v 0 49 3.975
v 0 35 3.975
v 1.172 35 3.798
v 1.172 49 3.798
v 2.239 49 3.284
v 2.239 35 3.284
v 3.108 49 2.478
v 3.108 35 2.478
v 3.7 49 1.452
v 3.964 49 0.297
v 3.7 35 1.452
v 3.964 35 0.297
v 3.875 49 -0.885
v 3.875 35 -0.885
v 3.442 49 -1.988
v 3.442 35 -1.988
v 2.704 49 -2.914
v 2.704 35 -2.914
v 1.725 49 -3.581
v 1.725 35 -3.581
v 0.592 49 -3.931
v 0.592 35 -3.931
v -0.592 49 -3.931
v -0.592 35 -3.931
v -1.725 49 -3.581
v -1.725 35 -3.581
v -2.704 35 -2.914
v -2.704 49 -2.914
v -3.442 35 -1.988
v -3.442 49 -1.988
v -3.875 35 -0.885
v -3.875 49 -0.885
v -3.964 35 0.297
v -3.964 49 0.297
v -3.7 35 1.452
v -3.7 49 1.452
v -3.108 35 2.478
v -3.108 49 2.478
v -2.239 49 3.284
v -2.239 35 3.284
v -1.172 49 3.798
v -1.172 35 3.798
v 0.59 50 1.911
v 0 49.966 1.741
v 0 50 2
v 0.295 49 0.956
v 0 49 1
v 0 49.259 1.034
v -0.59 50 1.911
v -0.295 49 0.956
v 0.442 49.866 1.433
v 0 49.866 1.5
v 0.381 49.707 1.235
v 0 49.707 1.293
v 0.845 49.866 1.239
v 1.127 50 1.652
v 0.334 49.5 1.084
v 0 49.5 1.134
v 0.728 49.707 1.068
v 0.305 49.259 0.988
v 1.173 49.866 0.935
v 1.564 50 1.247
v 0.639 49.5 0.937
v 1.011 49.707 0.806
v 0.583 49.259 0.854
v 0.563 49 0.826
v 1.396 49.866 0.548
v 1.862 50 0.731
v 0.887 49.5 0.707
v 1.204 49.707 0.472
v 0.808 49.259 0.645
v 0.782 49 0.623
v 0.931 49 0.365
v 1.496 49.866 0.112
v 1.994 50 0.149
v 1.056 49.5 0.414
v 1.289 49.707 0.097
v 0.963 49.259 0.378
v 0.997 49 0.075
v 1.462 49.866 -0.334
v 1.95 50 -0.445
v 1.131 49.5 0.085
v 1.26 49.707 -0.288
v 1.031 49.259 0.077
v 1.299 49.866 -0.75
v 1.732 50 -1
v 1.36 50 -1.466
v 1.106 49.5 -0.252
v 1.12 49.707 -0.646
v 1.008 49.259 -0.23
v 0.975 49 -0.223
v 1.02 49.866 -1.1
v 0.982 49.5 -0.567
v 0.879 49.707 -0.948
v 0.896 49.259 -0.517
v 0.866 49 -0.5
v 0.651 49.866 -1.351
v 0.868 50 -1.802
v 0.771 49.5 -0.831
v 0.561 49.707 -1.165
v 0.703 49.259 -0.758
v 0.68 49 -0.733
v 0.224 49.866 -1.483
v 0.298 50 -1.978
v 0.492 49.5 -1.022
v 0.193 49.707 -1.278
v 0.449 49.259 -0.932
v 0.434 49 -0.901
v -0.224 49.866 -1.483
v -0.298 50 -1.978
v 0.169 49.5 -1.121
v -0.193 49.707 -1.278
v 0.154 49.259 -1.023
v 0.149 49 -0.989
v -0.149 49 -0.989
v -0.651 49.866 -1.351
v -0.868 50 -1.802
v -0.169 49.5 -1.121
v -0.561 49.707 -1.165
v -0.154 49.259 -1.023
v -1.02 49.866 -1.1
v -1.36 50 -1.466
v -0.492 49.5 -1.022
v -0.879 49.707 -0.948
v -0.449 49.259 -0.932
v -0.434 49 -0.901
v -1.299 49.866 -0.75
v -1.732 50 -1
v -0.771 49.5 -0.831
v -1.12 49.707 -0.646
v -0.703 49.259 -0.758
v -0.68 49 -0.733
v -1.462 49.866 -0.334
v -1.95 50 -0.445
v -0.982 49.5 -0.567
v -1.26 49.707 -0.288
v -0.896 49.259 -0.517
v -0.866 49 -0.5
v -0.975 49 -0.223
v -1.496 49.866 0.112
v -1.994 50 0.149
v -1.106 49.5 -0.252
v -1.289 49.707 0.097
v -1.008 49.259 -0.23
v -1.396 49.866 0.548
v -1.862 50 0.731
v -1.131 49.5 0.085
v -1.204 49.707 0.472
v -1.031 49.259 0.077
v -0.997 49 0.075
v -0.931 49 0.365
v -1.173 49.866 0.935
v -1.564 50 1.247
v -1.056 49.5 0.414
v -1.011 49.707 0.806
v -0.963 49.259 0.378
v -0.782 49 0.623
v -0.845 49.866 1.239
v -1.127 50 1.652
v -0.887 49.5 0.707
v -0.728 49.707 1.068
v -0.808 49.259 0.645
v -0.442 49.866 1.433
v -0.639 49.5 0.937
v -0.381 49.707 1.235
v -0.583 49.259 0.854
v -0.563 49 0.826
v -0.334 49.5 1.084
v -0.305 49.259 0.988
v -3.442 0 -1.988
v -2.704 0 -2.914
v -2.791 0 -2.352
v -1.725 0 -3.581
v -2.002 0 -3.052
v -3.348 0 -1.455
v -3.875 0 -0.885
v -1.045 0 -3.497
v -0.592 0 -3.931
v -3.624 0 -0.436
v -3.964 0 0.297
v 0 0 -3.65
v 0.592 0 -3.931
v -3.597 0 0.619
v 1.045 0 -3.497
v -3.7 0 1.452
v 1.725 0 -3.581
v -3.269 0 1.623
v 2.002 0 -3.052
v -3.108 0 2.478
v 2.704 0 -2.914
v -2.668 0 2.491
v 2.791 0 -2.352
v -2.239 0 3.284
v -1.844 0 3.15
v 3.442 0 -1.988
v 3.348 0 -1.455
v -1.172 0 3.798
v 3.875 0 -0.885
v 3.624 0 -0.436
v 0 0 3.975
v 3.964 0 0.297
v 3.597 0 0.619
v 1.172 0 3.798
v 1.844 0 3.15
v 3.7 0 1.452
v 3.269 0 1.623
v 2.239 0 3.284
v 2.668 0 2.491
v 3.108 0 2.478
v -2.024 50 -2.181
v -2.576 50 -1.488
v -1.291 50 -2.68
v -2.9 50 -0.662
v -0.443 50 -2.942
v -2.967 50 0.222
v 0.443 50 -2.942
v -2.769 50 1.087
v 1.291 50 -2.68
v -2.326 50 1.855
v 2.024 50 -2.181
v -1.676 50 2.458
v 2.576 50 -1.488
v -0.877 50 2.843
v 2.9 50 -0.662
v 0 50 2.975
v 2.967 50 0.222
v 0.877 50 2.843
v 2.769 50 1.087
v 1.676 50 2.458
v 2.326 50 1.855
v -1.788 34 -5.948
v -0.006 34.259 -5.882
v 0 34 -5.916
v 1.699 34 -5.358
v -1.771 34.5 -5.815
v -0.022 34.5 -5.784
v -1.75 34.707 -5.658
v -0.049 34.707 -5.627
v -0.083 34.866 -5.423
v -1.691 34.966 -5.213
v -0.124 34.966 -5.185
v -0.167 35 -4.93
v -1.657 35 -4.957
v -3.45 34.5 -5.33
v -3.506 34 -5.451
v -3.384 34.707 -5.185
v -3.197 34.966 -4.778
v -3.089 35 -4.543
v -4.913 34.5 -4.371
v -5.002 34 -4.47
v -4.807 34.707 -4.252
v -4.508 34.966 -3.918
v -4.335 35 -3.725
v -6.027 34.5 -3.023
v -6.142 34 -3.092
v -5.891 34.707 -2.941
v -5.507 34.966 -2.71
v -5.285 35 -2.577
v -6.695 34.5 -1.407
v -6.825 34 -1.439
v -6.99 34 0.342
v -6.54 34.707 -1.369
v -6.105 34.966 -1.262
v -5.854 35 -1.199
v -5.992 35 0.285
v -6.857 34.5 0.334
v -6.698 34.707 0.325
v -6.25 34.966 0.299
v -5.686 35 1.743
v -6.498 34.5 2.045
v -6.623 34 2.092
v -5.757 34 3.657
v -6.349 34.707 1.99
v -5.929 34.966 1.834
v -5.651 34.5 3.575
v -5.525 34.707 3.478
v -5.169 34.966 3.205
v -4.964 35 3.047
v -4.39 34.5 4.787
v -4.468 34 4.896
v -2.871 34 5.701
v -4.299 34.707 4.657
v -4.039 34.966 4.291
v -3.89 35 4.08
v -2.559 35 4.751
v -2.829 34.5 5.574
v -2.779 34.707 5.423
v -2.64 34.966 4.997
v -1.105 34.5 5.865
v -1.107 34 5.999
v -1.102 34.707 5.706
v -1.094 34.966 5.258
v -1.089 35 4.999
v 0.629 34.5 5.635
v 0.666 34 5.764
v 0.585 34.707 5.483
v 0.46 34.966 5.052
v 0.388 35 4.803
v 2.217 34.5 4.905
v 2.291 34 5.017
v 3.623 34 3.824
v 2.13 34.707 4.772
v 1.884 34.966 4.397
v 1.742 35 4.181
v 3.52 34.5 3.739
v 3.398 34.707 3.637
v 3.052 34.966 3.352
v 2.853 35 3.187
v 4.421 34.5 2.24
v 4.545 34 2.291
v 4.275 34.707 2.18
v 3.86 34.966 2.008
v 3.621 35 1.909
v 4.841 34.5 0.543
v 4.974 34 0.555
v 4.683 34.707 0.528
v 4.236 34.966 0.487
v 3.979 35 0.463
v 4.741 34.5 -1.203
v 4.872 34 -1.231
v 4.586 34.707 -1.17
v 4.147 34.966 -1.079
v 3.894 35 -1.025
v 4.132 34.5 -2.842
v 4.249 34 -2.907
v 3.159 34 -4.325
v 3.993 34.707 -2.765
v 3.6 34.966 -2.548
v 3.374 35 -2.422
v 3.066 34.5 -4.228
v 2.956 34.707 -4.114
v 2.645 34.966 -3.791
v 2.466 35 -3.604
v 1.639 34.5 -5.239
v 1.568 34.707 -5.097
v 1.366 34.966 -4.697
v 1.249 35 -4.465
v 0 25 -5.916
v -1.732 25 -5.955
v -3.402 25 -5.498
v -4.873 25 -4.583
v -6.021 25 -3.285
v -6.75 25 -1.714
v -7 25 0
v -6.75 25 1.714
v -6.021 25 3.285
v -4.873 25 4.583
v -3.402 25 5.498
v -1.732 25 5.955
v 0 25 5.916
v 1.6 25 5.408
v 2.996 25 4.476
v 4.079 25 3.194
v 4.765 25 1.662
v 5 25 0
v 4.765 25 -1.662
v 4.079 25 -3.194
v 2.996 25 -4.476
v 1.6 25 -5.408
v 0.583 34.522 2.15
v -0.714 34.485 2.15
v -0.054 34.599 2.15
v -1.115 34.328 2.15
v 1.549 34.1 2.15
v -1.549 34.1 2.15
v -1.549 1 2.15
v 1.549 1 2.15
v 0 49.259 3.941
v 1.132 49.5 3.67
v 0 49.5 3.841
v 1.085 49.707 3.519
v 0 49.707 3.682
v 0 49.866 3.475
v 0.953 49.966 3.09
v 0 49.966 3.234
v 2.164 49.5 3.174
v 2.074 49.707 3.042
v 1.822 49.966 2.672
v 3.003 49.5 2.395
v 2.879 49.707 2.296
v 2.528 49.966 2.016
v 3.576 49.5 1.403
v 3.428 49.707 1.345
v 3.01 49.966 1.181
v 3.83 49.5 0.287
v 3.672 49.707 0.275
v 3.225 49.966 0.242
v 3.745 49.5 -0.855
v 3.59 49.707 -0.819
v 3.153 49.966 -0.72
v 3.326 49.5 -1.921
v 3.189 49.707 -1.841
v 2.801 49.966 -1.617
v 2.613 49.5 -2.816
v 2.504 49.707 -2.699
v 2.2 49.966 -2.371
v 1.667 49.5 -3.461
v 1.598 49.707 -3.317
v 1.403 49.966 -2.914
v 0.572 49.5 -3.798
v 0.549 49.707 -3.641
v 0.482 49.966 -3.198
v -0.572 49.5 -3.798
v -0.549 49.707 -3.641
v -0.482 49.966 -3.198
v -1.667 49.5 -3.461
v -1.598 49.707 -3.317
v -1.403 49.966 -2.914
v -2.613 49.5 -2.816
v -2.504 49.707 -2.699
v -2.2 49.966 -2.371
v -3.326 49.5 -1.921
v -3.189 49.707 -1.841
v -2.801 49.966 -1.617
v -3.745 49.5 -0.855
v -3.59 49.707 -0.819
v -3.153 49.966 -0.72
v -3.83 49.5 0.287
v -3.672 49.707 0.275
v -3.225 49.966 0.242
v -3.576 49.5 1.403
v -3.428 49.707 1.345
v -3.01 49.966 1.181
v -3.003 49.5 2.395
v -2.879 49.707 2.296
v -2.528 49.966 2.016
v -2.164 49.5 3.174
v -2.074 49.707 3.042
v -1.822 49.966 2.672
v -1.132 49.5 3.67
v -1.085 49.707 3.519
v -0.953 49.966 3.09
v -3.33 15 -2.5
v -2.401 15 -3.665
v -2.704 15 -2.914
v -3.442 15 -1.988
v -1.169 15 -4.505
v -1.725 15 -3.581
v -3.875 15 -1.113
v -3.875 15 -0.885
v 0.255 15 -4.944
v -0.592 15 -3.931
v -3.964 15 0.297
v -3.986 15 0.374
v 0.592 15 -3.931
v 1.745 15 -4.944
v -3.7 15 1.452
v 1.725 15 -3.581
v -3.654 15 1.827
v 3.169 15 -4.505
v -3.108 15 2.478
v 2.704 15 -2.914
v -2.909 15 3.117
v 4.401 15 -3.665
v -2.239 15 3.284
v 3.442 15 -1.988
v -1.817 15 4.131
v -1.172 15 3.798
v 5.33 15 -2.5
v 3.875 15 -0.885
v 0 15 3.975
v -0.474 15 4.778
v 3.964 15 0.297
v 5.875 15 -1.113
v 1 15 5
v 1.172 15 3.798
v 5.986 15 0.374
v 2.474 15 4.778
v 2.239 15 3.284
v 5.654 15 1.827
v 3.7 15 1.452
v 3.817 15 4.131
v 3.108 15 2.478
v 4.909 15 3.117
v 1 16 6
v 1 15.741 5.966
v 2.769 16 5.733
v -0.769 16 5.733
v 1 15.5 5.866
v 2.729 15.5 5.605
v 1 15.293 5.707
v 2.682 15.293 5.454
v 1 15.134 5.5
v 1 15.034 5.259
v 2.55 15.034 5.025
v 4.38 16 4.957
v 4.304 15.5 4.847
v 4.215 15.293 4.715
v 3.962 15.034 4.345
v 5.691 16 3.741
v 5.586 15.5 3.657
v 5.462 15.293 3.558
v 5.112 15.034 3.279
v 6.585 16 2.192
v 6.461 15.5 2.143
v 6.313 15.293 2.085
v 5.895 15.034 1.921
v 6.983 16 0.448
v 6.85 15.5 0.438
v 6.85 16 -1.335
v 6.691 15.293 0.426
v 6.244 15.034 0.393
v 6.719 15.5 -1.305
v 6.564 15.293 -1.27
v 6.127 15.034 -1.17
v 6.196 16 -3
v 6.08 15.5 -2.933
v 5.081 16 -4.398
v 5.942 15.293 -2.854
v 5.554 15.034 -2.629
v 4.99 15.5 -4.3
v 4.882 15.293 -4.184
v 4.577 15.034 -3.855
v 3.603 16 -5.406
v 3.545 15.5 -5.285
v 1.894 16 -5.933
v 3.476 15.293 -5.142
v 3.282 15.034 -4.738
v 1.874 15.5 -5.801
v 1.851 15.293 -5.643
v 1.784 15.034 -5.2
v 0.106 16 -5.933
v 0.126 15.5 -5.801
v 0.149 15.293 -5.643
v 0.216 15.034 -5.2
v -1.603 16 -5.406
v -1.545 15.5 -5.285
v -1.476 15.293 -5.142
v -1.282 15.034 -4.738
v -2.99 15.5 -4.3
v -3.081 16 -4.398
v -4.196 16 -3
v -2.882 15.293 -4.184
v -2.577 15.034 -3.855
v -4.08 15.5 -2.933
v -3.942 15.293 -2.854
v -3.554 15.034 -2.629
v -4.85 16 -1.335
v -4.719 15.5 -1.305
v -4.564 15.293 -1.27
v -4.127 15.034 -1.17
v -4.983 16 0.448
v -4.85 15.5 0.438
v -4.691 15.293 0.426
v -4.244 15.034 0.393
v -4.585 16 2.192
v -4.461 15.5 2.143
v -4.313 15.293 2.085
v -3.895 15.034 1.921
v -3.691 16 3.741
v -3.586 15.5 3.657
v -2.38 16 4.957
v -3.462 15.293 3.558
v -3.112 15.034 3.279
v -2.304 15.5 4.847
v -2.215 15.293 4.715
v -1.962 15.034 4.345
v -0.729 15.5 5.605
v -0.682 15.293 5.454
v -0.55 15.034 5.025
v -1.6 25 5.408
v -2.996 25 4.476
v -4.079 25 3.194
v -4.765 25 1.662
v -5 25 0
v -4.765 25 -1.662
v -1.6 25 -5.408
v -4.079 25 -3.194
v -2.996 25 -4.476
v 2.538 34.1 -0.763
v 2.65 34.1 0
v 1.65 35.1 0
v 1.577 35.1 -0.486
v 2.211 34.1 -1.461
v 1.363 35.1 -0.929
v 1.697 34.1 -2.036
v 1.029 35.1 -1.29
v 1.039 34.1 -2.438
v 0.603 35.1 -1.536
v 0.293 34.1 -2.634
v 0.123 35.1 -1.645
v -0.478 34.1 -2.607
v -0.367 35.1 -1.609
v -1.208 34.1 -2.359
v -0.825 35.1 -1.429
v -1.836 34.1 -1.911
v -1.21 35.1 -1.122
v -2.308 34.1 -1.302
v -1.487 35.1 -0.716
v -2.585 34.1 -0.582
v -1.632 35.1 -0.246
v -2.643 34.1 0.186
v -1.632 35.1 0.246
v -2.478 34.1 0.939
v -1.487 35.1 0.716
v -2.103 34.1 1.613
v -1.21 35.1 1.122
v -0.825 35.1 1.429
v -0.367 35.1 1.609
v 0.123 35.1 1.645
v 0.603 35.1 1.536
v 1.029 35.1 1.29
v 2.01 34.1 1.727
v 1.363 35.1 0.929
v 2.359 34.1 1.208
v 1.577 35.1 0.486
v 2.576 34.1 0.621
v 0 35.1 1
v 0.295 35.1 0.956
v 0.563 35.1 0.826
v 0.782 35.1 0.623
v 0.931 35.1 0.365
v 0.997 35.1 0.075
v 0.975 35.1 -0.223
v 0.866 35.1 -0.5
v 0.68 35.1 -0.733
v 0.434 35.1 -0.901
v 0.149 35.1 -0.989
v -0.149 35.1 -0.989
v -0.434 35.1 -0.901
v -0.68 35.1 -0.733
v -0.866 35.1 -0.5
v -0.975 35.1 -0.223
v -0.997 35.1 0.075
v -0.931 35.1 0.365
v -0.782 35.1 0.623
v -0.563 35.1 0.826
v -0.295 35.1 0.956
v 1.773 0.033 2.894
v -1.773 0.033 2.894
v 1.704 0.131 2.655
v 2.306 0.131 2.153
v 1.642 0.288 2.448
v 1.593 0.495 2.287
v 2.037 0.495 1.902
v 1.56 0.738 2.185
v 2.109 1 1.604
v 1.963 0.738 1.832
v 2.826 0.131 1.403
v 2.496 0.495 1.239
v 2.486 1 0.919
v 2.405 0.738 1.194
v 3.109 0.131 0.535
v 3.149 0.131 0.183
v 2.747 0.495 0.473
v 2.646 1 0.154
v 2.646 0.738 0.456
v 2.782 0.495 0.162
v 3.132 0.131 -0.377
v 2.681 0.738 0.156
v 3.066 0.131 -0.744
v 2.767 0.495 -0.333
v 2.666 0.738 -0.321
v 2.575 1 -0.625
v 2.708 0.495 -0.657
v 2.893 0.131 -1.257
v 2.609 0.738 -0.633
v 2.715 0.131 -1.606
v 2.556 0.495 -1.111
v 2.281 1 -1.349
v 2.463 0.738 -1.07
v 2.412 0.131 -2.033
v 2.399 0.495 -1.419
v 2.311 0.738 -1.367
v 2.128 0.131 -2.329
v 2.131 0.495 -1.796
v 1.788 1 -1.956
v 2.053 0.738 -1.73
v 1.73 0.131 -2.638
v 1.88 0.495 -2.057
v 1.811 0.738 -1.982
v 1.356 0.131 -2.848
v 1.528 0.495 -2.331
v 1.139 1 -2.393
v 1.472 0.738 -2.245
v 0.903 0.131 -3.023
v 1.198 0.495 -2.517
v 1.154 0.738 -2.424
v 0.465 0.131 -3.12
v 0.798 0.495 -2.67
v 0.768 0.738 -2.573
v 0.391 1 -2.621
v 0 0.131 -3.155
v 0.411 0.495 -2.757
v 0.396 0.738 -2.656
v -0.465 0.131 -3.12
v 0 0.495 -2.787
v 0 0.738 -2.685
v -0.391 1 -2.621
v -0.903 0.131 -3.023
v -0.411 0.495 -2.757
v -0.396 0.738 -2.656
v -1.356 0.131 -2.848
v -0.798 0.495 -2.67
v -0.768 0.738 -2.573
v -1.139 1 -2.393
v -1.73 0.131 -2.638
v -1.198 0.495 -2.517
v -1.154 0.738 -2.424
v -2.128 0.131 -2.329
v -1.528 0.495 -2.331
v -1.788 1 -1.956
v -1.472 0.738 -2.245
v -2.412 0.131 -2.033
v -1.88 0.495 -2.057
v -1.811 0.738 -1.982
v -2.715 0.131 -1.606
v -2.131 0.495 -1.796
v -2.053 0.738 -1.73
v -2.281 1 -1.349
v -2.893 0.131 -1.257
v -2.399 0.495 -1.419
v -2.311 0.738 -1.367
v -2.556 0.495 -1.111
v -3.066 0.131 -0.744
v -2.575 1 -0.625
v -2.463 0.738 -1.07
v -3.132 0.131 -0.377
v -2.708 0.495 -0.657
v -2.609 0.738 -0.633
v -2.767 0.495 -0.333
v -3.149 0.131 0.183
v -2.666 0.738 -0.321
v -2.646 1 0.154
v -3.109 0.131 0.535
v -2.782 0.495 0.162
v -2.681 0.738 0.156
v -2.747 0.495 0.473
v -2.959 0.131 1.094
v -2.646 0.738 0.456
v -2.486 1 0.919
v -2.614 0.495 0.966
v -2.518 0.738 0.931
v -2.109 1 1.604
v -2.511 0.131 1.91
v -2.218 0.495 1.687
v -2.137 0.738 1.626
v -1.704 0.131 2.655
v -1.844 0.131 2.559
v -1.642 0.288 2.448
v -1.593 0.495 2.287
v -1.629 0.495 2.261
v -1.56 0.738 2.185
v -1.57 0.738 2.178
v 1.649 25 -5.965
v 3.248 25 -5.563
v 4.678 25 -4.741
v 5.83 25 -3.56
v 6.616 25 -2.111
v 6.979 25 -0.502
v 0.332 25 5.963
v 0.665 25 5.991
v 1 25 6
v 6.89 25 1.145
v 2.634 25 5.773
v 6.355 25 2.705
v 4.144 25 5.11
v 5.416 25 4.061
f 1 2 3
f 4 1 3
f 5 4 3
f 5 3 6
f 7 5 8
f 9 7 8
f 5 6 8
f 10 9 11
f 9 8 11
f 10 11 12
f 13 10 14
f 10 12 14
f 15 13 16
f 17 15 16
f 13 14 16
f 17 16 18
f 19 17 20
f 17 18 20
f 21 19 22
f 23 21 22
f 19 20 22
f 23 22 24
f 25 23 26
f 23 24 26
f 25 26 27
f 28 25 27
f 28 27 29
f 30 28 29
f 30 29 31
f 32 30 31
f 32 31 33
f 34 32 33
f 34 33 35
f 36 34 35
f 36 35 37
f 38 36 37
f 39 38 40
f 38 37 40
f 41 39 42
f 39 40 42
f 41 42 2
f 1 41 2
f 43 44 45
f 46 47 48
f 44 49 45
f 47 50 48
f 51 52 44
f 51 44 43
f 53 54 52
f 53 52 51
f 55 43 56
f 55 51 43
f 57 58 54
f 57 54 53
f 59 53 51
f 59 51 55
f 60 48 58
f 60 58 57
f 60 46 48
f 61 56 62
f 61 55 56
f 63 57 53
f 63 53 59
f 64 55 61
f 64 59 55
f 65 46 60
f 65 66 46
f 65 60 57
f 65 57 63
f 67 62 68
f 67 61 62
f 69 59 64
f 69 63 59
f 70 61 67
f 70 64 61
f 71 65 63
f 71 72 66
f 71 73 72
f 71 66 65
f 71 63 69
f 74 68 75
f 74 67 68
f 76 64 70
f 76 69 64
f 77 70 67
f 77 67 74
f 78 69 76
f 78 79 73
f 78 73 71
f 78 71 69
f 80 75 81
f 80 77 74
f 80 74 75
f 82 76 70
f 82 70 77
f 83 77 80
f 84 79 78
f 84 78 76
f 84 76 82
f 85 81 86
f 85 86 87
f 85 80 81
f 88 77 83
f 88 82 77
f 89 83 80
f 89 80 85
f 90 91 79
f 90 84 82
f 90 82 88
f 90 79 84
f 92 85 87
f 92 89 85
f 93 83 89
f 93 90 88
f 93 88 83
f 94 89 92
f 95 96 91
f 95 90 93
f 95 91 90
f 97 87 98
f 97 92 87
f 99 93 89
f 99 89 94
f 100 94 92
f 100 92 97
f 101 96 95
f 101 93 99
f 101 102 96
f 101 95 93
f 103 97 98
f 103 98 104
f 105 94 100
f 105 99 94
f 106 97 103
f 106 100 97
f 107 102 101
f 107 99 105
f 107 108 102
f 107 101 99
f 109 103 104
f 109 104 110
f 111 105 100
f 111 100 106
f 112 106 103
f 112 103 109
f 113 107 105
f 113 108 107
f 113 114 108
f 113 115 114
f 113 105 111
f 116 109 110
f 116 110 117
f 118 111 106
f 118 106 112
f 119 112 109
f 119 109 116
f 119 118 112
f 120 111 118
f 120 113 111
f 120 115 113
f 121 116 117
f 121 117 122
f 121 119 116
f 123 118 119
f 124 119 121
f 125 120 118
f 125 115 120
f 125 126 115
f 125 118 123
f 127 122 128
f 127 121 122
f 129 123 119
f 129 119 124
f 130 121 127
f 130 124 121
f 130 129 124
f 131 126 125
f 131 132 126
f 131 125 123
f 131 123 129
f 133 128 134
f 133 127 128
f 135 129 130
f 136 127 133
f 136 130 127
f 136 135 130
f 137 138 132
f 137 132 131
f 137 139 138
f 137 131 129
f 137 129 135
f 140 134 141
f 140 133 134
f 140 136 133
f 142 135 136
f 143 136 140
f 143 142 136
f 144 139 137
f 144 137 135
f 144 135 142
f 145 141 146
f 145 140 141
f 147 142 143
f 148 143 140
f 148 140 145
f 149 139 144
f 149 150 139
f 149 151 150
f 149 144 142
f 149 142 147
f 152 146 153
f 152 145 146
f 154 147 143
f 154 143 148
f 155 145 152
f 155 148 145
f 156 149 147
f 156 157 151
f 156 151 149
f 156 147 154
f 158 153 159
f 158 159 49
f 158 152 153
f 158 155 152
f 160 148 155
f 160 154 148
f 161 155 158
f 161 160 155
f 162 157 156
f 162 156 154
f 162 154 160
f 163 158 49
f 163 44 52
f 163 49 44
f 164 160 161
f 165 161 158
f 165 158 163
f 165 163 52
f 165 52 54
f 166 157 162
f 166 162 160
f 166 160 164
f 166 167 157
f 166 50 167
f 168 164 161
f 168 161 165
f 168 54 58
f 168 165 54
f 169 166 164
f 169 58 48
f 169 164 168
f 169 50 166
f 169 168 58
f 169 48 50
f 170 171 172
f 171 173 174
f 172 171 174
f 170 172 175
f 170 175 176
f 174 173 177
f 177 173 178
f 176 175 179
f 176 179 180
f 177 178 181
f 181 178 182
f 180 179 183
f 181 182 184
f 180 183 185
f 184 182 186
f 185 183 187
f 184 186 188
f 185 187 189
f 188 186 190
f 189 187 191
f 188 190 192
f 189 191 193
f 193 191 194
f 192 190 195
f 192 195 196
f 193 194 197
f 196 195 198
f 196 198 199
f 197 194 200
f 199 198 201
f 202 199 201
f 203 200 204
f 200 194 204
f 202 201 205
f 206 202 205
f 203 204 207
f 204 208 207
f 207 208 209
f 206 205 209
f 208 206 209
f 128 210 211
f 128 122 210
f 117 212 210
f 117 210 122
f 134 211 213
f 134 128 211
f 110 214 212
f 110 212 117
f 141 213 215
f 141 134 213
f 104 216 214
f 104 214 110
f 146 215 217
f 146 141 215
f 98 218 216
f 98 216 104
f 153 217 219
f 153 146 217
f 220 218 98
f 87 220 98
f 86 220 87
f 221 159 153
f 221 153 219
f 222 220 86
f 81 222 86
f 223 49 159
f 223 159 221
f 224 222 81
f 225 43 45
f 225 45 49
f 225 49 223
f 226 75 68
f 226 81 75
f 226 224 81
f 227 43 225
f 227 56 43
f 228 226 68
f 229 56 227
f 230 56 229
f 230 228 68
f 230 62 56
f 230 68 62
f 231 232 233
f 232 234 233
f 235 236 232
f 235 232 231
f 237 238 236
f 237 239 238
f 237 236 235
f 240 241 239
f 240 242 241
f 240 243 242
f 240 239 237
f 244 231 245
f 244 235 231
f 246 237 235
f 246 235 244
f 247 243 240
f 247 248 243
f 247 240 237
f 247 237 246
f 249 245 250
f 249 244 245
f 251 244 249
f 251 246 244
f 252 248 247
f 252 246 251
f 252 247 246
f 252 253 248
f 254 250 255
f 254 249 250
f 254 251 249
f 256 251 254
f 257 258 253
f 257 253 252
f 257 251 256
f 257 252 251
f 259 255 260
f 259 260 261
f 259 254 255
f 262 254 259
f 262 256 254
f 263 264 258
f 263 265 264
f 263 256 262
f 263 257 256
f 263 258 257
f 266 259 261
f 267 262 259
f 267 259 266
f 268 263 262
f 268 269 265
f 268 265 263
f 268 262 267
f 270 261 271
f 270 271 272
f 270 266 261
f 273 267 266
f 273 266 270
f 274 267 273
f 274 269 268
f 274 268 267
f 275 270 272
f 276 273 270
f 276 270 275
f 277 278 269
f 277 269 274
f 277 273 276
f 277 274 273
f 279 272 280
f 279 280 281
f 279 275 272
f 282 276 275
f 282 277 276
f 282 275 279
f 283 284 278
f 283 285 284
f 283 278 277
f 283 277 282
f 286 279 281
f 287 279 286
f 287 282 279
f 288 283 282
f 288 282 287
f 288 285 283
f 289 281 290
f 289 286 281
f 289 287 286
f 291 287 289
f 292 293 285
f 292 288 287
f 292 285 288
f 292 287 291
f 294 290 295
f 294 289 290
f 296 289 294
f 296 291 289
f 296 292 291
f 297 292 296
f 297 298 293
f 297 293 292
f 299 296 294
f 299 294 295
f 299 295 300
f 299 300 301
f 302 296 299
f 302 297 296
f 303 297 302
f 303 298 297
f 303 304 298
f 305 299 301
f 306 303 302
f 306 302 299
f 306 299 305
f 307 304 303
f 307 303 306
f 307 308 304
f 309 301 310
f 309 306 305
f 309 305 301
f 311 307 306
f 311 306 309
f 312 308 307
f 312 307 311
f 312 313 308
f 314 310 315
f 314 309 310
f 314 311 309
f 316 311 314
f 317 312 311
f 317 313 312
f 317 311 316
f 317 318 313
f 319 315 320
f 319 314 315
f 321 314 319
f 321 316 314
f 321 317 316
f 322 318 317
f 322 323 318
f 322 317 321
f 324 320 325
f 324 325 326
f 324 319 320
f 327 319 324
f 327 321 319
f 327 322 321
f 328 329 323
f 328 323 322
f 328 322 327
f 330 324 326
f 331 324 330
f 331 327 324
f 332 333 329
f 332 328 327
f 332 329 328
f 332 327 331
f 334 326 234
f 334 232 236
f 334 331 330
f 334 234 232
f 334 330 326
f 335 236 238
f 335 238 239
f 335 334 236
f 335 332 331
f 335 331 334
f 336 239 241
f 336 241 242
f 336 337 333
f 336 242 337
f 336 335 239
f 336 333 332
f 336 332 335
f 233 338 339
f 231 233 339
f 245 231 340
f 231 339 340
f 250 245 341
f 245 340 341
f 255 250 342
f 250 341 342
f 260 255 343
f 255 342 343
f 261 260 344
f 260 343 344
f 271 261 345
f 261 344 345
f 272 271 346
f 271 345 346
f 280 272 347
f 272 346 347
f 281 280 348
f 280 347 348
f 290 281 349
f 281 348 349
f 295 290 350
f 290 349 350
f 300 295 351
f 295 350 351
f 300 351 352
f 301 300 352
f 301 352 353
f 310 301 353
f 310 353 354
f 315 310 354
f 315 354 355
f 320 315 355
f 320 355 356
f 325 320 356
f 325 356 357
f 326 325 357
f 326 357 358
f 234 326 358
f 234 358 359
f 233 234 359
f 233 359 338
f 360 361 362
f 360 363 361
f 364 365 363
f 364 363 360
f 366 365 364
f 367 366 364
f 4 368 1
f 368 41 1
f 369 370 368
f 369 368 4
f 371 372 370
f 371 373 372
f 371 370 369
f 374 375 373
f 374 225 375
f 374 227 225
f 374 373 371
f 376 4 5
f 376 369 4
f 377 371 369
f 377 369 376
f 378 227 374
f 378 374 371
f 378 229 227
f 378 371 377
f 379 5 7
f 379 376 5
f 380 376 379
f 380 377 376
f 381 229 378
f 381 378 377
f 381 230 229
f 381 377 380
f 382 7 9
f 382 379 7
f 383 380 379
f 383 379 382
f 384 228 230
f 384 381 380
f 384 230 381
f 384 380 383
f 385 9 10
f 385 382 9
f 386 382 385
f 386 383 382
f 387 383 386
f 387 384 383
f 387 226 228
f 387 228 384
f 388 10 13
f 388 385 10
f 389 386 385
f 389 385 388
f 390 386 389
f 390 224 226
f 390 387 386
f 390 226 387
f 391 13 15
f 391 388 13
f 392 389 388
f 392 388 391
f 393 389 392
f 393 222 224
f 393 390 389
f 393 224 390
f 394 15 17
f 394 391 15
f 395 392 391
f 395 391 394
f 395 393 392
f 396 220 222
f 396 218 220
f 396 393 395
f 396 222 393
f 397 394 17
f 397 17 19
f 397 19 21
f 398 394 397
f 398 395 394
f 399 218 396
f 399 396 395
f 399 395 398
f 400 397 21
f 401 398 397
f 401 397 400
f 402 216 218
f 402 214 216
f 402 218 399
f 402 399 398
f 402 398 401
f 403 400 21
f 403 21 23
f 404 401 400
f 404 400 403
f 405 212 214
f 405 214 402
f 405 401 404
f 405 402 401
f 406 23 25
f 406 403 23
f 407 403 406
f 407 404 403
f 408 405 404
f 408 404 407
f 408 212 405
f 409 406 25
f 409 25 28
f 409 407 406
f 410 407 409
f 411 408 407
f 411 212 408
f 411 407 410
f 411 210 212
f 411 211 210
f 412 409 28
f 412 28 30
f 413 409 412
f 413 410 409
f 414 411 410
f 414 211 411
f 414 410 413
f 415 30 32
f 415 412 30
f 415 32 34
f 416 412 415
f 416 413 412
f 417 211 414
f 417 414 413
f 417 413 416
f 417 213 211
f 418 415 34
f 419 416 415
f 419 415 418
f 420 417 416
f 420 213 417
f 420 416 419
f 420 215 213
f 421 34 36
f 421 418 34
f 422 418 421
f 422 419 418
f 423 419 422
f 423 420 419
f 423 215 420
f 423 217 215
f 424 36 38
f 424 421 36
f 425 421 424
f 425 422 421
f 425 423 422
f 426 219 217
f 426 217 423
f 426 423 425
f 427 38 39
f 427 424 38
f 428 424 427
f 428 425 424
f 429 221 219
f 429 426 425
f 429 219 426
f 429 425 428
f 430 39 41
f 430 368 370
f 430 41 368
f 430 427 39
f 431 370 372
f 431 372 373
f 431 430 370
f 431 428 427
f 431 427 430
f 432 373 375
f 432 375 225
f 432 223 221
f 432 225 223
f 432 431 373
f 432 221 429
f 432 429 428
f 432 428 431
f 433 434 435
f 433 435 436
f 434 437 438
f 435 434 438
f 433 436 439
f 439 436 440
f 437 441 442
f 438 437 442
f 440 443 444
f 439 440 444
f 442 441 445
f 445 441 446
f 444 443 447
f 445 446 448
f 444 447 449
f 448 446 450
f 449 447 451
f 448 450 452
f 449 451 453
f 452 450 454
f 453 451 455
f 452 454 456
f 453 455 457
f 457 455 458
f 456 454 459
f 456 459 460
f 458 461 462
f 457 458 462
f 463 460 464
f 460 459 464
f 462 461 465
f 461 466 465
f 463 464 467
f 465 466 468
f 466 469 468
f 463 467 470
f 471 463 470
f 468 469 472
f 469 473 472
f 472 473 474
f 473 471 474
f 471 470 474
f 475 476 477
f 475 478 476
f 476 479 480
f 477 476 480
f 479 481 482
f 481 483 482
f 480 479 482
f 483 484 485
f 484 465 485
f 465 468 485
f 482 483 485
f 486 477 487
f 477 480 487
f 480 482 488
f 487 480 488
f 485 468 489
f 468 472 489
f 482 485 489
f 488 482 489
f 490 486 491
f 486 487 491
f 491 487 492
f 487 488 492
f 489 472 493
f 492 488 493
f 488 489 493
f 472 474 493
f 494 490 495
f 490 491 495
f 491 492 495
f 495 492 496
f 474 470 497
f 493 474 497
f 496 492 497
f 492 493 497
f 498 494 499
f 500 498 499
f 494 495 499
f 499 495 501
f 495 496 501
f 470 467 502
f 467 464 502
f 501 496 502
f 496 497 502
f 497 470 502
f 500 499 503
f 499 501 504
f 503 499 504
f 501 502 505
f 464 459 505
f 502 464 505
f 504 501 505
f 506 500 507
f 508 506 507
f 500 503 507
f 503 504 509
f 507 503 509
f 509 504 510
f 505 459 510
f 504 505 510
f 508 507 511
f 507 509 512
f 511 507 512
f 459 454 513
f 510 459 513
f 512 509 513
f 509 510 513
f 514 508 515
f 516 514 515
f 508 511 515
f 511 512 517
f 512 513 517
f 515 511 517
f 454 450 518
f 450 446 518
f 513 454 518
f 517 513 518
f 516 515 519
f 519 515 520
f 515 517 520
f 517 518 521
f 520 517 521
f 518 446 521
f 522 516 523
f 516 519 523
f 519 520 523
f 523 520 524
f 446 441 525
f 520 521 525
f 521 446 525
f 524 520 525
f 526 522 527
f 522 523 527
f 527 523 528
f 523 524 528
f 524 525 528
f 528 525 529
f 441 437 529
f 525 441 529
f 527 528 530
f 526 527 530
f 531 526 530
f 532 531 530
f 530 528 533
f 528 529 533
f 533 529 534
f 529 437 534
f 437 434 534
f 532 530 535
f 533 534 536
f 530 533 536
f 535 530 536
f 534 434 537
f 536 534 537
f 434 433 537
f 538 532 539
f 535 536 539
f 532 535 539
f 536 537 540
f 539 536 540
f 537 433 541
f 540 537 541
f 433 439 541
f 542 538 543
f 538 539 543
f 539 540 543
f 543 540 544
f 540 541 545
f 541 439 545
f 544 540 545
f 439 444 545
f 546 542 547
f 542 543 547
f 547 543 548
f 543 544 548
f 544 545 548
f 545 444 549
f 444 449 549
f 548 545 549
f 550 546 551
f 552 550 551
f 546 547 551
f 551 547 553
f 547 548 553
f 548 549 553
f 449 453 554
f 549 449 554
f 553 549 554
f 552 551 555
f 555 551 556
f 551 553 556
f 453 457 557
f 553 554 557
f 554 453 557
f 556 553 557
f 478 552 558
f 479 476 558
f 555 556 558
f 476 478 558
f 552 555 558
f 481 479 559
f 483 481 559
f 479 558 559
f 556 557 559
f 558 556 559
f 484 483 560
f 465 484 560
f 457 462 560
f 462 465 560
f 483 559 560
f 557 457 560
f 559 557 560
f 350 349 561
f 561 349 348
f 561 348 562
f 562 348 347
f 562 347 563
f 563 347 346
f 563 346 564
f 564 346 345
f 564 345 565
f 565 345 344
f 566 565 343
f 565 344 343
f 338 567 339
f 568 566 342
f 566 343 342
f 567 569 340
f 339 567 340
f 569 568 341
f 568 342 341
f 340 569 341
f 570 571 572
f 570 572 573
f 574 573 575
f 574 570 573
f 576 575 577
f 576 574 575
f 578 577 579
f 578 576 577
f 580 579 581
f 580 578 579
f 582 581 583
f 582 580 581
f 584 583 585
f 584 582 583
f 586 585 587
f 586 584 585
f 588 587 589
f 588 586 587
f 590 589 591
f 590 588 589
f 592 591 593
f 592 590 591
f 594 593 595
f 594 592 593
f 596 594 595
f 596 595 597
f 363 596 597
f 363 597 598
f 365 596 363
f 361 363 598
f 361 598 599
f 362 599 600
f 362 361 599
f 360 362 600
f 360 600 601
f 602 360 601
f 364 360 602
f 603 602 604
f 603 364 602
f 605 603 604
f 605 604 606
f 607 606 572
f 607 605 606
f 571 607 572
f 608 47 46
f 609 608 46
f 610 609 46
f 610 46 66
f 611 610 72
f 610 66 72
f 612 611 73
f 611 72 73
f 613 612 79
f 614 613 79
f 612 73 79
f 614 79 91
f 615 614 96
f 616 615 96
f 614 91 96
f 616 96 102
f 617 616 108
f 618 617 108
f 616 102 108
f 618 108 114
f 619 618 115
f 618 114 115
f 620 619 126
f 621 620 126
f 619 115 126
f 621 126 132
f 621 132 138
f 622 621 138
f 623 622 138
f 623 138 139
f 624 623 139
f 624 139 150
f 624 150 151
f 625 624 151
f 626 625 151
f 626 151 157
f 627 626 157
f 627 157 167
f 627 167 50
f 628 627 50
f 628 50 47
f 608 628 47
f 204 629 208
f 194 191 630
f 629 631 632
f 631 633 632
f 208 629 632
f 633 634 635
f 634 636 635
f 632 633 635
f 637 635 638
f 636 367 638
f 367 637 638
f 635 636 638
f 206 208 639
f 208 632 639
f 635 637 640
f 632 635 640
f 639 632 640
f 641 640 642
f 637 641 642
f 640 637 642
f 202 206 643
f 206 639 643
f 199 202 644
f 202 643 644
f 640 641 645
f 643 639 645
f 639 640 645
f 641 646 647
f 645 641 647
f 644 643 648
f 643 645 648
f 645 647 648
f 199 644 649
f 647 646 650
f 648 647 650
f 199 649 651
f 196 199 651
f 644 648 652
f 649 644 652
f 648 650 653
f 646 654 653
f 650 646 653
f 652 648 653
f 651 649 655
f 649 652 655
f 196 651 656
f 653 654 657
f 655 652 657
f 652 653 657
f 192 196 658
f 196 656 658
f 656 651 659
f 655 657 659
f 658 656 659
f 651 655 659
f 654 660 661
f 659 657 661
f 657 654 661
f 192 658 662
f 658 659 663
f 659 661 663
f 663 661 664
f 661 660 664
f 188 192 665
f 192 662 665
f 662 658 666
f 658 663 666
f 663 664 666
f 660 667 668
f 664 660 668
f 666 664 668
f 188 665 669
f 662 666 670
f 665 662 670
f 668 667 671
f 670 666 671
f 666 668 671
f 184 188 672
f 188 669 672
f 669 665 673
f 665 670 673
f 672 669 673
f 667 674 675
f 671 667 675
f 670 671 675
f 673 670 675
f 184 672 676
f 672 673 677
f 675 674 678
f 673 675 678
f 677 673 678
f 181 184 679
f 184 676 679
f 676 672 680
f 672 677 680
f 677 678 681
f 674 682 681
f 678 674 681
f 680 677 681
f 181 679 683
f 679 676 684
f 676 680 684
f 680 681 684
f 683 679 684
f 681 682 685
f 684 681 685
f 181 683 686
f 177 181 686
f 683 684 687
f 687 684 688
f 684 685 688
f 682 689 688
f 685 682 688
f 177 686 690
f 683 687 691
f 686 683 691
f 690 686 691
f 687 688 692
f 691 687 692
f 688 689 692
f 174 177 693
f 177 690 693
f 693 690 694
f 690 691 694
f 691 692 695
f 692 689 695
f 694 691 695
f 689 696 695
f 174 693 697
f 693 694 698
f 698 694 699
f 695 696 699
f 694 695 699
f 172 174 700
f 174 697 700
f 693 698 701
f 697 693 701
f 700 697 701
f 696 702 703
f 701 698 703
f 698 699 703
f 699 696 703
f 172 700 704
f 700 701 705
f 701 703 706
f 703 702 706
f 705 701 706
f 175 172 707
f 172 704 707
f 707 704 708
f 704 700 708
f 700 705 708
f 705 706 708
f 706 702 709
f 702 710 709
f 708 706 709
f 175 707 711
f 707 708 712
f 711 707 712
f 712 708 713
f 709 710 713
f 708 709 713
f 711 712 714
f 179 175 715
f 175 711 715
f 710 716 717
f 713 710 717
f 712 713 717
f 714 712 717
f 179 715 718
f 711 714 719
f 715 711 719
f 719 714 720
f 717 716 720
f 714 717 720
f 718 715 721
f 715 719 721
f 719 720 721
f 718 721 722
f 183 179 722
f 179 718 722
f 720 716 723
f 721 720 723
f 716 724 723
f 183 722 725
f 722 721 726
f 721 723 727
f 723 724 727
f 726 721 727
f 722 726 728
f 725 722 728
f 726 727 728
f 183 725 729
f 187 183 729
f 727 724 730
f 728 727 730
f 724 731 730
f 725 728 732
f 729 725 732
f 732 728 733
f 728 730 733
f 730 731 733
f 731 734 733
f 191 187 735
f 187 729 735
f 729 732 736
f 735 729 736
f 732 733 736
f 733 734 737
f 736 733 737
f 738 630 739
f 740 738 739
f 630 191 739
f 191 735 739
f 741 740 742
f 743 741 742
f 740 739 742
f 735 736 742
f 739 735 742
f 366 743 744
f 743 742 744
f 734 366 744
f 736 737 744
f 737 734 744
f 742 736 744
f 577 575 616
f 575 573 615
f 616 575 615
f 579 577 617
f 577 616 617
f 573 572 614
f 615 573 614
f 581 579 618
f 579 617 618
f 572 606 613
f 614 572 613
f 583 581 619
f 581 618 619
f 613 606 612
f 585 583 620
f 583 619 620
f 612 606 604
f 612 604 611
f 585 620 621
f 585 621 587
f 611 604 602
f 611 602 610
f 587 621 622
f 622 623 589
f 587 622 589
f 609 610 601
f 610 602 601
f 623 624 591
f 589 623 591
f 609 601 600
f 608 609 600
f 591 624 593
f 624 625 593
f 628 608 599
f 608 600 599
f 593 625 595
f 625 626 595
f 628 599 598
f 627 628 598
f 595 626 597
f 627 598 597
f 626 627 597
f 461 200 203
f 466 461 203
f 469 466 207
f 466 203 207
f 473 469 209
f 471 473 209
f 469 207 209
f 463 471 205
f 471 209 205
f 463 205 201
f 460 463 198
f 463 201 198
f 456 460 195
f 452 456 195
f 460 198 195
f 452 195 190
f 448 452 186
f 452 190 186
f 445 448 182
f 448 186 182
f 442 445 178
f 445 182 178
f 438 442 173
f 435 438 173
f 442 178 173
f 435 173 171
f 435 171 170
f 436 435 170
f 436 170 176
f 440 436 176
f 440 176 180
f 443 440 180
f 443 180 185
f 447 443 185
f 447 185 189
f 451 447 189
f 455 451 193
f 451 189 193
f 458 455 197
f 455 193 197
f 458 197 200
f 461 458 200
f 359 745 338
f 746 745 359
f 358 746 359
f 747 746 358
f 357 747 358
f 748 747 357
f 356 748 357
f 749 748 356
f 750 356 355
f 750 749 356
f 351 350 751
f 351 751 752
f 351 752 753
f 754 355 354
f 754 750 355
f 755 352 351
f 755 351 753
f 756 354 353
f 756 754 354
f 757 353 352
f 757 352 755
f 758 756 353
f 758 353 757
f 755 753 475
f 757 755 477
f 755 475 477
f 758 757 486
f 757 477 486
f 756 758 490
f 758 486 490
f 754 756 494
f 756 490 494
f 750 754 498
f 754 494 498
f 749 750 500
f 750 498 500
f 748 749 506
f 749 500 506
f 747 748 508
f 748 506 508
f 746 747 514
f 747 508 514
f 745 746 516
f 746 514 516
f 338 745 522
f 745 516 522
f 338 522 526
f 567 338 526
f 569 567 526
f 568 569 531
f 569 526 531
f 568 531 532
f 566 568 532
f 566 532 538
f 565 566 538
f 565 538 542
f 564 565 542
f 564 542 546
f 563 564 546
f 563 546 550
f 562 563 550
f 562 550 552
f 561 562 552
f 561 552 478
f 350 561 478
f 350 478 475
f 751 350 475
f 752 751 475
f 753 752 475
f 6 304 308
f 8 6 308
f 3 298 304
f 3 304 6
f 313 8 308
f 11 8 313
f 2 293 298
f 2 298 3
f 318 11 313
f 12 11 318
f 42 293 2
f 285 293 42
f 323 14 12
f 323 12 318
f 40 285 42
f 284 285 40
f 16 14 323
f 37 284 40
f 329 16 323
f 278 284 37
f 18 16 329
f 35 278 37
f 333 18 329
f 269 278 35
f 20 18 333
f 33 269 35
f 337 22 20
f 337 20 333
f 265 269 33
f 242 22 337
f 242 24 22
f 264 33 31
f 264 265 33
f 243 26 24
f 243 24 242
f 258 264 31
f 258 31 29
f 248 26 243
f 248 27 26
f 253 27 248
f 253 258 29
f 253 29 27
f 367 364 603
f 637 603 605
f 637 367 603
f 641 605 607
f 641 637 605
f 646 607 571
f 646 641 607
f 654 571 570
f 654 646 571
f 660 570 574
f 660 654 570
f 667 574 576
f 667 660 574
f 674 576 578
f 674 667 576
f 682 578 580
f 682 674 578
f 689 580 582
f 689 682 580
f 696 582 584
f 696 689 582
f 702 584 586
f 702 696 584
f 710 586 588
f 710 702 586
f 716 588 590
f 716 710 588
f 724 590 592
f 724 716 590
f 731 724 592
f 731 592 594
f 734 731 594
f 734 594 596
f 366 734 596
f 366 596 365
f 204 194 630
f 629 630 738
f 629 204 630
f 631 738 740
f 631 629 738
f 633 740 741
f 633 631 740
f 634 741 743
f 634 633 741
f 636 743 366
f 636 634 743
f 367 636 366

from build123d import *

# Parameters (mm, degrees)
SKETCH1_R           = 3.975
BOSS_EXTRUDE1_DEPTH = 15
SKETCH2_R           = 6
BOSS_EXTRUDE2_DEPTH = 10
SKETCH3_R           = 6
BOSS_EXTRUDE3_DEPTH = 10
SKETCH4_R           = 3.975
BOSS_EXTRUDE4_DEPTH = 15
CUT_EXTRUDE1_DEPTH  = 35.1
SKETCH6_R           = 1
CUT_EXTRUDE2_DEPTH  = 45
FILLET1_R           = 1
FILLET2_R           = 1


with BuildPart() as part:
    # Sketch1 → Boss-Extrude1 (new body)
    with BuildSketch(Plane(origin=(0, 0, 0), x_dir=(1, 0, 0), z_dir=(0, 1, 0))):
        with Locations(Location((0, 0, 0), (0, 0, 270))):
            Circle(SKETCH1_R)
    extrude(amount=BOSS_EXTRUDE1_DEPTH)

    # Sketch2 → Boss-Extrude2 (add)
    with BuildSketch(Plane(origin=(0, 15, 0), x_dir=(1, 0, 0), z_dir=(0, 1, 0))):
        with Locations(Location((1, 0, 0), (0, 0, 270))):
            Circle(SKETCH2_R)
    extrude(amount=BOSS_EXTRUDE2_DEPTH)

    # Sketch3 → Boss-Extrude3 (add)
    with BuildSketch(Plane(origin=(0, 25, 0), x_dir=(1, 0, 0), z_dir=(0, 1, 0))):
        with Locations(Location((-1, 0, 0), (0, 0, 80.405931773))):
            Circle(SKETCH3_R)
    extrude(amount=BOSS_EXTRUDE3_DEPTH)

    # Sketch4 → Boss-Extrude4 (add)
    with BuildSketch(Plane(origin=(0, 35, 0), x_dir=(1, 0, 0), z_dir=(0, 1, 0))):
        with Locations(Location((0, 0, 0), (0, 0, 270))):
            Circle(SKETCH4_R)
    extrude(amount=BOSS_EXTRUDE4_DEPTH)

    # Sketch5 → Cut-Extrude1 (cut)
    with BuildSketch(Plane.XZ):
        with BuildLine():
            Line((-1.549193338, 2.15), (1.549193338, 2.15))
            ThreePointArc((1.549193338, 2.15), (0, -2.65), (-1.549193338, 2.15))
        make_face()
    extrude(amount=-CUT_EXTRUDE1_DEPTH, mode=Mode.SUBTRACT)

    # Sketch6 → Cut-Extrude2 (cut)
    with BuildSketch(Plane(origin=(0, 50, 0), x_dir=(1, 0, 0), z_dir=(0, 1, 0))):
        with Locations(Location((0, 0, 0), (0, 0, 270))):
            Circle(SKETCH6_R)
    extrude(amount=-CUT_EXTRUDE2_DEPTH, mode=Mode.SUBTRACT)

    # Fillet1
    fillet1_edges = [part.edges().sort_by_distance(p)[0] for p in [
        (-2, 35, 5.916079783),
        (0, 50, -3.975),
        (0, 50, -1),
        (1, 15, -6),
    ]]
    fillet(fillet1_edges, radius=FILLET1_R)

    # Fillet2
    fillet2_edges = [part.edges().sort_by_distance(p)[0] for p in [
        (0, 0, -2.65),
        (0, 0, 2.15),
    ]]
    fillet(fillet2_edges, radius=FILLET2_R)

    # Chamfer1: read off the stored shape, not the designer's step
    # Chamfer1 outline → Chamfer1 (revolve)
    with BuildSketch(Plane.XY):
        Polygon((2.65, 35.1), (1.65, 35.1), (2.65, 34.1), align=None)
    revolve(axis=Axis((0, 0, 0), (0, 1, 0)))


solid = part.part
